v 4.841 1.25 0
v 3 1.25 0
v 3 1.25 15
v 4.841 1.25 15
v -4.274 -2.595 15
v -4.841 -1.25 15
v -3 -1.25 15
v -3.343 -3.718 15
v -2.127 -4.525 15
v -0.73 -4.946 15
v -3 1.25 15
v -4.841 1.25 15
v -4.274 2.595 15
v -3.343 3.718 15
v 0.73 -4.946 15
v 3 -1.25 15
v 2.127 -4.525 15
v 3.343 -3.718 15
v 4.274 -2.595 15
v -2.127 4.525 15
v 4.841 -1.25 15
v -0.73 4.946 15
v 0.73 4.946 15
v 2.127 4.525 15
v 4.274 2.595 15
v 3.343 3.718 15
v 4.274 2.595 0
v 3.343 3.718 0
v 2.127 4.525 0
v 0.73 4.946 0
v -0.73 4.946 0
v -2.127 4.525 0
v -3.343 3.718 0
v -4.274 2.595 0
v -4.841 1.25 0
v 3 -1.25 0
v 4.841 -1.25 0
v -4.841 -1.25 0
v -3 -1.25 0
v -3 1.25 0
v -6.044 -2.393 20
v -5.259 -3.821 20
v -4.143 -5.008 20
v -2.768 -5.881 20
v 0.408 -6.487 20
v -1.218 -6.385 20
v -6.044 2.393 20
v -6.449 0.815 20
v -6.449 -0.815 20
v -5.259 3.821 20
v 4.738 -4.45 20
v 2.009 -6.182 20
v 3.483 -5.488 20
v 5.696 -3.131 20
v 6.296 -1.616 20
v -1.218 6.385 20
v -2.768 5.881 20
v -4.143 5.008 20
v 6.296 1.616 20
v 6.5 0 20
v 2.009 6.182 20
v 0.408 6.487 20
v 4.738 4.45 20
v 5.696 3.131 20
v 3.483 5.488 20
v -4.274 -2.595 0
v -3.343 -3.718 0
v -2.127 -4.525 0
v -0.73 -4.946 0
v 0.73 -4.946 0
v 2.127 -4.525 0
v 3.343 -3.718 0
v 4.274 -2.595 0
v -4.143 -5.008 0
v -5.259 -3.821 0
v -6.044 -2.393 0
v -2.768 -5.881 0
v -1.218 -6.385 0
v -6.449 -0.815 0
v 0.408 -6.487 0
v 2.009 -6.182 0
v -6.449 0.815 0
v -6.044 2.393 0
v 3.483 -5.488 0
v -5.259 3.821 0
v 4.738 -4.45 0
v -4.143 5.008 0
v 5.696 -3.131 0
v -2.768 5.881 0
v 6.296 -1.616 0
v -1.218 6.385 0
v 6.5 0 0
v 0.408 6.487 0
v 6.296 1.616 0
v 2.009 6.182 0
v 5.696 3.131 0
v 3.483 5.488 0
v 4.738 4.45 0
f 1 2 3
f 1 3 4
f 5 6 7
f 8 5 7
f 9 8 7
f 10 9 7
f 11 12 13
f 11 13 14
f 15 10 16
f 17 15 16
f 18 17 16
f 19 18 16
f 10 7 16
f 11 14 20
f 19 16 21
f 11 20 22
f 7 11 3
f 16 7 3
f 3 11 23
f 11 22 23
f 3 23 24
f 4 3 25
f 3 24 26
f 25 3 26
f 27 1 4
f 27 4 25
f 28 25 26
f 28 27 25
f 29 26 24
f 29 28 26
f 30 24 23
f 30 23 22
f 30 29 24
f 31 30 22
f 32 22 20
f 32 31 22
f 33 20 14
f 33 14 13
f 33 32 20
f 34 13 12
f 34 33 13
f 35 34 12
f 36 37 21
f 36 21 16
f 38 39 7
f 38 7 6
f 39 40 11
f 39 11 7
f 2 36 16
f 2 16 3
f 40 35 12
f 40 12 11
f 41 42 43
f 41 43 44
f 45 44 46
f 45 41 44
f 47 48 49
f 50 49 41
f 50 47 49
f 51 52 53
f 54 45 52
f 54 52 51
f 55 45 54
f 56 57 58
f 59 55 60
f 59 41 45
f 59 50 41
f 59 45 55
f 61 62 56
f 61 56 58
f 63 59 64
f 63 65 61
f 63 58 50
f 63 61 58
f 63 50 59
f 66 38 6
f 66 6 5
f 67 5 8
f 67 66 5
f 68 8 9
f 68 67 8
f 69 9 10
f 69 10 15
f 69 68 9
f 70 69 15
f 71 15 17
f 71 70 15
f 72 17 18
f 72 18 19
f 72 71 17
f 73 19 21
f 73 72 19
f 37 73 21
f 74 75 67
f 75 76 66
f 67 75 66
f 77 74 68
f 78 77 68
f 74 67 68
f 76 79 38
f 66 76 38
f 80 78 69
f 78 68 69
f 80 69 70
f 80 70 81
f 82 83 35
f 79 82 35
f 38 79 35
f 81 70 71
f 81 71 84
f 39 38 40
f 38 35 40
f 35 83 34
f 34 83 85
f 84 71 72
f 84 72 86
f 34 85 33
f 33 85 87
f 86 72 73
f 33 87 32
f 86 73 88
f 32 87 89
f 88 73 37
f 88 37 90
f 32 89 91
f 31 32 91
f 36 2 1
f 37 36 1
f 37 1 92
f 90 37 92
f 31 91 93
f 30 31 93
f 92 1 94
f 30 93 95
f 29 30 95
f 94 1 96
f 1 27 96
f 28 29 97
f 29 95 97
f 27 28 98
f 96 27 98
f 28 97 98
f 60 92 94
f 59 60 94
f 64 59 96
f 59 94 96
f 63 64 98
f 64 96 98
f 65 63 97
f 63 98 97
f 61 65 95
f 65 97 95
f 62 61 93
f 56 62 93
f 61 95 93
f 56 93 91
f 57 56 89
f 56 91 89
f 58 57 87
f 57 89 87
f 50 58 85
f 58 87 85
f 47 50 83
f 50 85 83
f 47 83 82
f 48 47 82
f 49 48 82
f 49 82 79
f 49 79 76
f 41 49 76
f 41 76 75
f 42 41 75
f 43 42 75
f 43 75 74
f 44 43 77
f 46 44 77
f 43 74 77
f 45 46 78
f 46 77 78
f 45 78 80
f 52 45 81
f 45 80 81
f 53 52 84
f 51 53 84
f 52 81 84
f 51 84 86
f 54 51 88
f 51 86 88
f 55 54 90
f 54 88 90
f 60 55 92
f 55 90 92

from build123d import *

# Parameters (mm, degrees)
F1_R     = 6.5
F2_DEPTH = 20
F3_DEPTH = 15


with BuildPart() as f2:
    # F1 (on Top) → F2 (new body)
    with BuildSketch(Plane.XY):
        Circle(F1_R)
    extrude(amount=F2_DEPTH)

    # F0 (on Top) → F3 (cut)
    with BuildSketch(Plane.XY):
        with BuildLine():
            Line((3, 0), (3, 1.25))
            Line((3, 1.25), (4.841229, 1.25))
            ThreePointArc((4.841229, 1.25), (0, 5), (-4.841229, 1.25))
            Line((-4.841229, 1.25), (-3, 1.25))
            Line((-3, 1.25), (-3, 0))
            Line((-3, 0), (-3, -1.25))
            Line((-3, -1.25), (-4.841229, -1.25))
            ThreePointArc((-4.841229, -1.25), (0, -5), (4.841229, -1.25))
            Line((4.841229, -1.25), (3, -1.25))
            Line((3, -1.25), (3, 0))
        make_face()
    extrude(amount=F3_DEPTH, mode=Mode.SUBTRACT)


solid = f2.part
